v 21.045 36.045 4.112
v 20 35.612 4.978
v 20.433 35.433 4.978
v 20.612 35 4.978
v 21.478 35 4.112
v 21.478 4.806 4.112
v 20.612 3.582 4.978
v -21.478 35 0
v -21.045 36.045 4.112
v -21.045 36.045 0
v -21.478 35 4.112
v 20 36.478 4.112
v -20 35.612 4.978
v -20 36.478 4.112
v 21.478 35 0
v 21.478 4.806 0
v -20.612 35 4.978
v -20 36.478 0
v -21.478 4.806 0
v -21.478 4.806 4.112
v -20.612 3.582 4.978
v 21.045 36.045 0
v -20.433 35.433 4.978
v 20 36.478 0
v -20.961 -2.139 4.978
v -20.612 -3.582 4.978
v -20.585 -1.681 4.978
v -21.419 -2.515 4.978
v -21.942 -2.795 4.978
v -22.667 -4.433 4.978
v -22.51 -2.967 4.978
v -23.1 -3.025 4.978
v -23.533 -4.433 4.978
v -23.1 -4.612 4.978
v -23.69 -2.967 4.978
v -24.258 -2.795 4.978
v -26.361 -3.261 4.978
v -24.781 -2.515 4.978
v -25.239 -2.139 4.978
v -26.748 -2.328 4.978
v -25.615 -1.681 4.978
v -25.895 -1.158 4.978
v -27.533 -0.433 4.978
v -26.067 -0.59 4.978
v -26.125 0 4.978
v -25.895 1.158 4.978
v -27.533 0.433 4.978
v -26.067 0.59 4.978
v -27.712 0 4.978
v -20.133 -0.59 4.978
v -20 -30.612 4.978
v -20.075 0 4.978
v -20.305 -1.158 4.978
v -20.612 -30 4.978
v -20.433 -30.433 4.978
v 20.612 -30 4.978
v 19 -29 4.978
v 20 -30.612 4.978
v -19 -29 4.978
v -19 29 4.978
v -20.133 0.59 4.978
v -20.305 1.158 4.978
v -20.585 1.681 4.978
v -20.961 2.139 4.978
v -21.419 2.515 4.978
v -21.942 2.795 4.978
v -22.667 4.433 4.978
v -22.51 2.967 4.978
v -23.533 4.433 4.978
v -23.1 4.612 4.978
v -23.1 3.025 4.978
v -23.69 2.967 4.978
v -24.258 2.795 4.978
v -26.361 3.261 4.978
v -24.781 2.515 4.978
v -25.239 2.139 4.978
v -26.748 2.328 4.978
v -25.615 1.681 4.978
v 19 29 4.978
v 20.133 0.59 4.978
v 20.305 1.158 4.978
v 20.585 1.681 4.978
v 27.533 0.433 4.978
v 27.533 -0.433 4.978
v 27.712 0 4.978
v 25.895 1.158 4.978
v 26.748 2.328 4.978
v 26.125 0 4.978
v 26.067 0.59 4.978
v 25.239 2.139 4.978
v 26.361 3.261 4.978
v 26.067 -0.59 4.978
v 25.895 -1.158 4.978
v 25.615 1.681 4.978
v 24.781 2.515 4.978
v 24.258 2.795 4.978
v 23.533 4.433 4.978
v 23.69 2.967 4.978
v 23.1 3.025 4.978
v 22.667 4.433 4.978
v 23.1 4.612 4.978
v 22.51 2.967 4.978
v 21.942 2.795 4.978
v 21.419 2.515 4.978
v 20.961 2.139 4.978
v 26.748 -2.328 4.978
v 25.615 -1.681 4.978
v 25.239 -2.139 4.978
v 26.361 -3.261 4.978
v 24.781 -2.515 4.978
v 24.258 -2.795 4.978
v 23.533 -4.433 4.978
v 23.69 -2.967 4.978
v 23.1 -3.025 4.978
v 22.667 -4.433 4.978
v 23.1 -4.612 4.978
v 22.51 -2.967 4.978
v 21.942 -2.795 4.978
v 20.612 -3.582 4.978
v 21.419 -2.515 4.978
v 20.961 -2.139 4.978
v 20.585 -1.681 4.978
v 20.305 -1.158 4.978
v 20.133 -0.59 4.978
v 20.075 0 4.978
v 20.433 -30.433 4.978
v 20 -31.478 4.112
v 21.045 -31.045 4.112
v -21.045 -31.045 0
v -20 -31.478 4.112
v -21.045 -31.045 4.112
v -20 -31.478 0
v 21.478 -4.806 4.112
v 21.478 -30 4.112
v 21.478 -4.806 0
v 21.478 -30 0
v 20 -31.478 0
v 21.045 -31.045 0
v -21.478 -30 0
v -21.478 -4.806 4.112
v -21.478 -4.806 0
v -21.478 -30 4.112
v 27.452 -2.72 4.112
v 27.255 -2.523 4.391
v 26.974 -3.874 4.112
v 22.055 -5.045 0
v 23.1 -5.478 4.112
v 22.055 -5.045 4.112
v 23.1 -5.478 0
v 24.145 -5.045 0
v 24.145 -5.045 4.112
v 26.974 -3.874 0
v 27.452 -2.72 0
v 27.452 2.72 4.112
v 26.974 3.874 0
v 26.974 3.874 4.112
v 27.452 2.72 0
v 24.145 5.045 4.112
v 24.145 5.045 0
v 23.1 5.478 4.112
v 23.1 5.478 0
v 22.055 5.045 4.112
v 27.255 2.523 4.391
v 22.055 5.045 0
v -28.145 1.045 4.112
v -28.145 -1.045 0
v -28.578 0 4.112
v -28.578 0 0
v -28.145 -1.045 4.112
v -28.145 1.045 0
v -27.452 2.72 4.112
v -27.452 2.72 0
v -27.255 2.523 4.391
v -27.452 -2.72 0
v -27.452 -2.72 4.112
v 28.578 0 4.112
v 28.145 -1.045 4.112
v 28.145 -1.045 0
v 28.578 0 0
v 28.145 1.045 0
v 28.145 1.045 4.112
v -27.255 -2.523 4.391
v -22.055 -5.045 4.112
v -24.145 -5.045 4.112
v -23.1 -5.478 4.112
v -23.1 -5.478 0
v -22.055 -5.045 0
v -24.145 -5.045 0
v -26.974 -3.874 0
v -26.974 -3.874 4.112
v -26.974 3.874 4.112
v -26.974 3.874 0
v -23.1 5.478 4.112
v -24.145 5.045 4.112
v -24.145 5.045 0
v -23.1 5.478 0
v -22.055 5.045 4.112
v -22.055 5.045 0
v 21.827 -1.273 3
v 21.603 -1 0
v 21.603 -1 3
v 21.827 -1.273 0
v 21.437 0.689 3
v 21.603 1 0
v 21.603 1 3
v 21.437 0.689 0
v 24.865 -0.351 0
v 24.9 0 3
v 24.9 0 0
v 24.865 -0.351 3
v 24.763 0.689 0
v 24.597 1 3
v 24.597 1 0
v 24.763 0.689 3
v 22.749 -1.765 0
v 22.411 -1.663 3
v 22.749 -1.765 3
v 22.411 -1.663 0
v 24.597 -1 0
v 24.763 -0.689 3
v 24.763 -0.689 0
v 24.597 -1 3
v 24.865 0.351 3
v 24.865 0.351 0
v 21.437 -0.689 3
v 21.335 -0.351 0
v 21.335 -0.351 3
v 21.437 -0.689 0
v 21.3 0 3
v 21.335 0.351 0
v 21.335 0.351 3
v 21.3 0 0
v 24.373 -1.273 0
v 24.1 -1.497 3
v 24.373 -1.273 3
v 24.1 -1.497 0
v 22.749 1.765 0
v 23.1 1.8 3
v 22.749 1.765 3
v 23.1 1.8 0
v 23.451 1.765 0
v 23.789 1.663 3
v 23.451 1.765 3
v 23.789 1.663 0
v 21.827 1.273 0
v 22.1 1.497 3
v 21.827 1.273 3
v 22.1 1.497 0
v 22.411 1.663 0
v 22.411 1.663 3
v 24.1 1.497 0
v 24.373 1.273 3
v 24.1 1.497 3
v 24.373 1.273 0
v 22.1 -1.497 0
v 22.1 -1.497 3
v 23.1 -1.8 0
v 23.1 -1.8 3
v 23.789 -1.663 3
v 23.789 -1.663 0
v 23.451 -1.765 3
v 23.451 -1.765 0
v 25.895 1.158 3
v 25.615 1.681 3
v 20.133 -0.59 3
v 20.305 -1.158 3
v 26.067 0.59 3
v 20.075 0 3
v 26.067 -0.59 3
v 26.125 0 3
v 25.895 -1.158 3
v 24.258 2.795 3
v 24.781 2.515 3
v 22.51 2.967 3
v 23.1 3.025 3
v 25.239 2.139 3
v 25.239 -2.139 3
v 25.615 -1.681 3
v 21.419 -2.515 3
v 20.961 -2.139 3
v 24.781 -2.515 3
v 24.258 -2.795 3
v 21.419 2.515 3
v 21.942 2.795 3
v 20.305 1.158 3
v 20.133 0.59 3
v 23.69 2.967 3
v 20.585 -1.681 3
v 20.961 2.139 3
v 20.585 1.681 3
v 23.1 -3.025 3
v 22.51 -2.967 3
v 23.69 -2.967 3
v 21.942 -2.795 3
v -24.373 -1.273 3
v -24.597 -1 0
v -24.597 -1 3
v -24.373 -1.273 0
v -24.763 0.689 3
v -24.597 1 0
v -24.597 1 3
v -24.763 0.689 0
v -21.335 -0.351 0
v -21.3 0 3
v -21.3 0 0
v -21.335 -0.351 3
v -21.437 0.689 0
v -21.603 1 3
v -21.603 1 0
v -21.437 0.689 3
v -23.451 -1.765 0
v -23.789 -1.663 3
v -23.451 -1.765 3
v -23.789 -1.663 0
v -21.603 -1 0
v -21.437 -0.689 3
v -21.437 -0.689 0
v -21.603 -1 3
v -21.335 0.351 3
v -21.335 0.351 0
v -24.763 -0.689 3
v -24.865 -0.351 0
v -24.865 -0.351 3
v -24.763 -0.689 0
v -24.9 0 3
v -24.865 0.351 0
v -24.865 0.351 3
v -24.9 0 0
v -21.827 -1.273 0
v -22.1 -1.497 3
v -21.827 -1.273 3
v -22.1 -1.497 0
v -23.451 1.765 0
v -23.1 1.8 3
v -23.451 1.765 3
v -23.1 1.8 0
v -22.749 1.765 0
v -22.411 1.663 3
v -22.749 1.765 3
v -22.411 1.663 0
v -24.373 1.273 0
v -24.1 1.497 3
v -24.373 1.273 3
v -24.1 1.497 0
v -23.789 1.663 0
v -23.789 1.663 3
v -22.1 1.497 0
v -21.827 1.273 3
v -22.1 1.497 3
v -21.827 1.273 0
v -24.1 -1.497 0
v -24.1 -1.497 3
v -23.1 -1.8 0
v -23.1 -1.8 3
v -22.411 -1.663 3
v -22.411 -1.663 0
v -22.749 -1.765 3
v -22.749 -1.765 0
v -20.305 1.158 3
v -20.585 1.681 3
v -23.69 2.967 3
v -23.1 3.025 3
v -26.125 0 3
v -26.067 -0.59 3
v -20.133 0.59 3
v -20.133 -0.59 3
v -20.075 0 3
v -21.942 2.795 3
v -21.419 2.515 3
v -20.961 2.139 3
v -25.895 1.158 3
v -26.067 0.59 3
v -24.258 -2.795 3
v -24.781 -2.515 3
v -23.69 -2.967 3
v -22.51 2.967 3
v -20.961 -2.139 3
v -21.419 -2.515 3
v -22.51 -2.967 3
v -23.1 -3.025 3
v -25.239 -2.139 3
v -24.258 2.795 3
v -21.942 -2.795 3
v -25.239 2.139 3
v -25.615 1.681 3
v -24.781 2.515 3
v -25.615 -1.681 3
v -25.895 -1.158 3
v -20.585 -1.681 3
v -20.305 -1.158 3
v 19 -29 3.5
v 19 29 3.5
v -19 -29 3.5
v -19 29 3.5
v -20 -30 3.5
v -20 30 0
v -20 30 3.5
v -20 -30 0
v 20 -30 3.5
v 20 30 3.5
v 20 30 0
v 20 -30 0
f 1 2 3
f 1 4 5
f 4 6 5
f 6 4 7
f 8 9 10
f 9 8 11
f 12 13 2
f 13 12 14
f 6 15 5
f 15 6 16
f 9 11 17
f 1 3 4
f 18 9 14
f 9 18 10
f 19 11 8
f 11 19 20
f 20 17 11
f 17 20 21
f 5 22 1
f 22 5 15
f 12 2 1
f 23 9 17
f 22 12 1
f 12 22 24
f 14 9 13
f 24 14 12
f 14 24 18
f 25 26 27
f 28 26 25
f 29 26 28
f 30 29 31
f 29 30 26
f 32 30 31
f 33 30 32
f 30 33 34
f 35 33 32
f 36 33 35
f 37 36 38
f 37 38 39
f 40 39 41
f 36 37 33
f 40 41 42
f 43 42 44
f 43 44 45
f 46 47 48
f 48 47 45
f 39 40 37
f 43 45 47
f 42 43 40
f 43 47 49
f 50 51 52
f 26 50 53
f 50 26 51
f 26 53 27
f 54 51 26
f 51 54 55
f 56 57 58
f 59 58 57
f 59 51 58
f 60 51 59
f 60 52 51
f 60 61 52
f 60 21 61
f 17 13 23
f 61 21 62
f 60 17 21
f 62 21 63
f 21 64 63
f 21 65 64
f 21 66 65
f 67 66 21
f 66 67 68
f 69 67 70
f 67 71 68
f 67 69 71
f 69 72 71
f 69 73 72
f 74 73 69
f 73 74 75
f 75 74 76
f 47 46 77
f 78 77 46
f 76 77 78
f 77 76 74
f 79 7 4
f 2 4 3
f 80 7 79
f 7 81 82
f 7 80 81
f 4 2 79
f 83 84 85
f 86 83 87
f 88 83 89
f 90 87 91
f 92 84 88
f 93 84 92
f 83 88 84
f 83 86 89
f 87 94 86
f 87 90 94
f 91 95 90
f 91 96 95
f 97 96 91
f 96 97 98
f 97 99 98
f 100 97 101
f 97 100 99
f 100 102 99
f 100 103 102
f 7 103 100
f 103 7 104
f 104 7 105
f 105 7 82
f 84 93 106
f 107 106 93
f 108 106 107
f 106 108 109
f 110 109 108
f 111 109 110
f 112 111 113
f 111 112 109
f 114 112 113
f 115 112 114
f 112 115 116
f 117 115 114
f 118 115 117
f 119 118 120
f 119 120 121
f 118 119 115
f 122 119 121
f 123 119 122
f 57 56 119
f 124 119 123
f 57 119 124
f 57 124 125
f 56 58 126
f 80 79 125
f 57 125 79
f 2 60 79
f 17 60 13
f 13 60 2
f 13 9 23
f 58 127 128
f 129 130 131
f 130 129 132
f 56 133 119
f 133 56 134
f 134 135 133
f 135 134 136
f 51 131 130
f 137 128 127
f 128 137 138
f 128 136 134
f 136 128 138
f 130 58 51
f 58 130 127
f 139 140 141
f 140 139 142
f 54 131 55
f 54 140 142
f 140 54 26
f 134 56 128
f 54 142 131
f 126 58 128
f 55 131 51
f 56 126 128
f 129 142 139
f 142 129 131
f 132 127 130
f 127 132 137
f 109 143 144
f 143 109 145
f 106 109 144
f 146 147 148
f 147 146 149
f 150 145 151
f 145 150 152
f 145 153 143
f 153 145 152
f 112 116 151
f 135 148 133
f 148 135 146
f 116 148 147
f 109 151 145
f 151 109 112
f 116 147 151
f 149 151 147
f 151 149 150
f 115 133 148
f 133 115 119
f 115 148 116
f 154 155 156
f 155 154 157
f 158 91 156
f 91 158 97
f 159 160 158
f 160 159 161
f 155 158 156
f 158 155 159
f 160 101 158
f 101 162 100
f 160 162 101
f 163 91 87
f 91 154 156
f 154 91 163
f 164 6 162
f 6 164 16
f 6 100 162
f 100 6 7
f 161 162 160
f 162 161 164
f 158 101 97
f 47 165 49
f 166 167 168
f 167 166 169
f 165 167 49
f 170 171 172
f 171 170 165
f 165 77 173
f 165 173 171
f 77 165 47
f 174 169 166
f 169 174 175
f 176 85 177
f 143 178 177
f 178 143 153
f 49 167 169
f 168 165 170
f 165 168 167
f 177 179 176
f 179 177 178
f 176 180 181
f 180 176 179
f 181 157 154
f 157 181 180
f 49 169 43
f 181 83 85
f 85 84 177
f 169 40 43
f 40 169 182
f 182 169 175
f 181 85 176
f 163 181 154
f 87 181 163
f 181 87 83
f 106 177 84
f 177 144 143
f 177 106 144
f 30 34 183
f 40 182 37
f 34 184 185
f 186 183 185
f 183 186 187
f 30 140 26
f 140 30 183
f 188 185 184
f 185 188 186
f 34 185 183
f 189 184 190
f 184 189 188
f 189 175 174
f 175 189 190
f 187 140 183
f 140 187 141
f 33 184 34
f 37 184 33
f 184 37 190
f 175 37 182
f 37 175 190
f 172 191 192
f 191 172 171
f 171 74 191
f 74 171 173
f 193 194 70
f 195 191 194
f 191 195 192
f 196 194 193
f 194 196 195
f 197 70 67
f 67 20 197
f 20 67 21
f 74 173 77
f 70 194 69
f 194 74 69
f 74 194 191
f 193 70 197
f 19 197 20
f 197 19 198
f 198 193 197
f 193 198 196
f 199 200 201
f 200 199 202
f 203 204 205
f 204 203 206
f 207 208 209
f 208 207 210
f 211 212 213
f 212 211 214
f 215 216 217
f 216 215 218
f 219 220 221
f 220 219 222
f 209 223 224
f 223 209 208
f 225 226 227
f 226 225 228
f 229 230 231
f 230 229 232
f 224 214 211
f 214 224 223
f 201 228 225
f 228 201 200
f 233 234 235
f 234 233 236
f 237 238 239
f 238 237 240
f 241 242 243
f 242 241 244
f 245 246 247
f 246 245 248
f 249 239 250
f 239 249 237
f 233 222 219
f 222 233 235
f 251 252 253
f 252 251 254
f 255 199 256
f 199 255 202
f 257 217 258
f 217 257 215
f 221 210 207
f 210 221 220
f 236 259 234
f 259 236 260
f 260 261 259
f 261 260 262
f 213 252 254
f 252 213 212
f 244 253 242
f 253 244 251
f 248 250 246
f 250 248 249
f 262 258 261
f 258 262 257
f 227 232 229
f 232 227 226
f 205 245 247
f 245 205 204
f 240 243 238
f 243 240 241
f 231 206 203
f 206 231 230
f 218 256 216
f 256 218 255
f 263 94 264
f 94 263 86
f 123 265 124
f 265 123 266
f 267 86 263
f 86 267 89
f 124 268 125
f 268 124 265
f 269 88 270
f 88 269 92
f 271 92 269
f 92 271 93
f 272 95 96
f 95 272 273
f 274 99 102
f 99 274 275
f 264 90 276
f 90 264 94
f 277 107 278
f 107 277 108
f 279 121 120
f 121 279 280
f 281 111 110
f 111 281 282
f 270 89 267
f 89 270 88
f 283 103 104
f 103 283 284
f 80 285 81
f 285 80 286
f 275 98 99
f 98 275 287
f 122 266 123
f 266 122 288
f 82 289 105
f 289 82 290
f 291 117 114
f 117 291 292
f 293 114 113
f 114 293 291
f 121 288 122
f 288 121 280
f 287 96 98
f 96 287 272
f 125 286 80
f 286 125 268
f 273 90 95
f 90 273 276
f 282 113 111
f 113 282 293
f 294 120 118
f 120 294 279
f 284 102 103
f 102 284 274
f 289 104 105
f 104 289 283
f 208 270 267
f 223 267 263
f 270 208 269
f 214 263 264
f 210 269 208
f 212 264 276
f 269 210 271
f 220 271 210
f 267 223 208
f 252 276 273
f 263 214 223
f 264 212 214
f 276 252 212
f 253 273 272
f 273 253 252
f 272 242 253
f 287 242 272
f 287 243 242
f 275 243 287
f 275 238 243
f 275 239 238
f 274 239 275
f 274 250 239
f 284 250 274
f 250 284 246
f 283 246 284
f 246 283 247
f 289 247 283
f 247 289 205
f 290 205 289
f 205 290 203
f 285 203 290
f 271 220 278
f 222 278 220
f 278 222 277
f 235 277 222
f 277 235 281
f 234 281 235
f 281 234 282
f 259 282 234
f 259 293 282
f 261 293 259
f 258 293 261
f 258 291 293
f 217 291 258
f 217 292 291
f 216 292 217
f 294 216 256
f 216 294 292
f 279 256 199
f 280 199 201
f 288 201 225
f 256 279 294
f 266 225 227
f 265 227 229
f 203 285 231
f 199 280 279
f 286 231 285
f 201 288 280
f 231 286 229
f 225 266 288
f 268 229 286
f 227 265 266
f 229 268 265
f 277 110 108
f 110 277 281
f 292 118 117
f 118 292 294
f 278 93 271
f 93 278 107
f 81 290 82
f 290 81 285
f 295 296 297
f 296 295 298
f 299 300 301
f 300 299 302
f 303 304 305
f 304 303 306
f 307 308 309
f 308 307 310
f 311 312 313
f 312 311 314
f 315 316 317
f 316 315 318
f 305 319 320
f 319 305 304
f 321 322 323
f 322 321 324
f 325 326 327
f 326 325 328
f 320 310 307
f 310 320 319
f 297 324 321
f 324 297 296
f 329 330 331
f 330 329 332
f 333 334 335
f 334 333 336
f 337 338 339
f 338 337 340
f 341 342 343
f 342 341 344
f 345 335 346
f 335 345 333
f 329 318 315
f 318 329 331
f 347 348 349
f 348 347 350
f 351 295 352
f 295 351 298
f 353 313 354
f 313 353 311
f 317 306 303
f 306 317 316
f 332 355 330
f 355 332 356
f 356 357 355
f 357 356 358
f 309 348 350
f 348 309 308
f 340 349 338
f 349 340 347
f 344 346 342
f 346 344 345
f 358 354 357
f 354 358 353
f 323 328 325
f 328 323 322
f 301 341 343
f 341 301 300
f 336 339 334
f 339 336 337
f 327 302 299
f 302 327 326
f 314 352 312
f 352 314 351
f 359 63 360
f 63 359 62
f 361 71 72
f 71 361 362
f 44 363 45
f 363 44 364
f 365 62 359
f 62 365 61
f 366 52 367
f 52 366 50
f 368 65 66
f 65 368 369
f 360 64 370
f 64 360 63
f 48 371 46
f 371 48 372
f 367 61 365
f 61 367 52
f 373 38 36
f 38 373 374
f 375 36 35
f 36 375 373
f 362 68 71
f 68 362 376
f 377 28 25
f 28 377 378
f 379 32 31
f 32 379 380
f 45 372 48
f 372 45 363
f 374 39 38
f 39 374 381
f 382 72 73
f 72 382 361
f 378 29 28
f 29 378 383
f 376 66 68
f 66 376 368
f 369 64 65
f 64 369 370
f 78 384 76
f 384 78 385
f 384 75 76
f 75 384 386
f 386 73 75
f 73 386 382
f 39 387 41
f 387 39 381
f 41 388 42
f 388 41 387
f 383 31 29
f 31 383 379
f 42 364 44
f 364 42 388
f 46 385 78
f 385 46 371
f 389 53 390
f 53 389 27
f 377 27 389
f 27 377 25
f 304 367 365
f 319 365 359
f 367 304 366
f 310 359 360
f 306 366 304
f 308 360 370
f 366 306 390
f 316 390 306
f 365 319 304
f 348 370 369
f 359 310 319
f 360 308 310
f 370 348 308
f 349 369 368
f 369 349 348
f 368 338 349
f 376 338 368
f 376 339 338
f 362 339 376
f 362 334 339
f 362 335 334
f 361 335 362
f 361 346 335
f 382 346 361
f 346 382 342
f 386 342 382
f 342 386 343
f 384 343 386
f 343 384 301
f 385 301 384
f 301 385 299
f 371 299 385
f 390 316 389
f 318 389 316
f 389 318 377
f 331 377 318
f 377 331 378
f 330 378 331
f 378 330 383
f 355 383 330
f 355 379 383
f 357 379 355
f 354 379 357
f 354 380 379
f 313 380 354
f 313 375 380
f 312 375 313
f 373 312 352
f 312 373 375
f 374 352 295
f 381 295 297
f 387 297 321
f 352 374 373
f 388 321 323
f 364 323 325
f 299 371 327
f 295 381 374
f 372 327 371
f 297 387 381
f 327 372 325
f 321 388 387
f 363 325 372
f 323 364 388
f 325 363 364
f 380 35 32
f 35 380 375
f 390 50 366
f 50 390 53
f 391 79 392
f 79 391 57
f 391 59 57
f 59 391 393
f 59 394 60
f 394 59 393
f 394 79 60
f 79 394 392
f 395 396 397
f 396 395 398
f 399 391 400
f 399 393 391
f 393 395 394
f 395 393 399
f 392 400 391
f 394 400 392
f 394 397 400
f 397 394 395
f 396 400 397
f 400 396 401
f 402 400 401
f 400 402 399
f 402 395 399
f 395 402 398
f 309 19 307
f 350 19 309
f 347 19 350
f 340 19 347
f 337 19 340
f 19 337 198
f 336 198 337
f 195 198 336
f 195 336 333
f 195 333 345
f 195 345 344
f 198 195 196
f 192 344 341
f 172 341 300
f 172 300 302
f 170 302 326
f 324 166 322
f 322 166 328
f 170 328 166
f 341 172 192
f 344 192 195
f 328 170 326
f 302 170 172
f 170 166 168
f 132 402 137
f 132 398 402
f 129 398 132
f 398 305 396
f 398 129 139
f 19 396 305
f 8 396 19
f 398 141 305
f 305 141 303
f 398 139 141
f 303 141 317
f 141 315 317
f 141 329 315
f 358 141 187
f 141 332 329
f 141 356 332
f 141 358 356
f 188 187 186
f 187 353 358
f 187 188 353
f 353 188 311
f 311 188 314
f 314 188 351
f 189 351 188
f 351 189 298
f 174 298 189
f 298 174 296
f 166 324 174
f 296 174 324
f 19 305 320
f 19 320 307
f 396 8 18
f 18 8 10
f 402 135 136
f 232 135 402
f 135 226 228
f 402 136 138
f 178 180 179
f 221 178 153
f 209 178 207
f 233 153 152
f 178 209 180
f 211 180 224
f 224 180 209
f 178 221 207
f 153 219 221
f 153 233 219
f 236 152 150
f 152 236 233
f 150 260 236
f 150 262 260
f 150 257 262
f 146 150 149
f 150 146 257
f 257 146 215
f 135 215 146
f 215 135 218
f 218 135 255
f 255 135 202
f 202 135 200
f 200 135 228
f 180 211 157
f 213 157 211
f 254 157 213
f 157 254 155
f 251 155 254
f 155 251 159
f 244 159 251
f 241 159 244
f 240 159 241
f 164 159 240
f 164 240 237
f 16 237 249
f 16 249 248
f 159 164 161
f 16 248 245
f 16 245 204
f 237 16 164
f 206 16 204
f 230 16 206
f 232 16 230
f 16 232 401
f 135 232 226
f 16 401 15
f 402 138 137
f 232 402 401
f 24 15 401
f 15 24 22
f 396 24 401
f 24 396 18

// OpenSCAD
// file: syms.scad
module symY(t) {
    translate(t)
        children();
    mirror([0,1,0])
        translate(t)
            children();
}
module symX(t) {
    translate(t)
        children();
    mirror([1,0,0])
        translate(t)
            children();
}

module symZ(t) {
    translate(t)
        children();
    mirror([0,0,1])
        translate(t)
            children();
}

module	symXY(t) {
	tx=t[0];
	ty=t[1];
	tz=t[2];
	symX([tx,0,0])
	symY([0,ty,tz])
		children();
}

module magnetCut(D,S) {
    cylinder(d=D,h=10);
    for(d=[45,-45])
    rotate(d)
    cube([2*D,S,30],center=true);
}


// calculates the radius from "segment" paramers:
// https://en.wikipedia.org/wiki/Circular_segment
function    circleSlice2radius2(c,h) = (c*c/8/h)+ h/2;

function toInt(str) = 
    let(d = [for (s = str) ord(s) - 48], l = len(d) - 1)
    [for (i = 0, a = d[i];i <= l;i = i + 1, a = 10 * a + d[i]) a][l];
        
// main file
use <syms.scad>
W=1.6;

$fn=32;
Z=1.5+W;

mode="rc522";

module mount(A,B,hole_pos,PCB_H=3.5,MOUNT_BODY_D=8,INSET=1,TP=0) {
    C=PCB_H;
    K=MOUNT_BODY_D;
    Q=INSET;
    difference() {
        minkowski() {
            union() {
                linear_extrude(height=C)
                translate([0,TP/2])
                square([A,B+TP],center=true);
                for(p=hole_pos) {
                    translate(p)
                    cylinder($fn=8,d=K,h=C);
                }
            }
            sphere(W,$fn=8);
        }
        linear_extrude(height=100,center=true)
        offset(-Q)
        square([A,B],center=true);

        linear_extrude(height=2*C,center=true)
        square([A,B],center=true);

        for(p=hole_pos) {
            translate(p) {
                cylinder(d=3.6,h=100,center=true);
                translate([0,0,C+W-2.1])
                cylinder(d=6.05,h=100);
            }
        }
        translate([-100,-100,-200])
        cube(200);
    }
}

if(mode=="rc522") {
    A=40;
    B=60;
    hole_pos=[ [A/2+Z,0],-[A/2+Z,0] ];
    mount(A,B,hole_pos,TP=5);
}
